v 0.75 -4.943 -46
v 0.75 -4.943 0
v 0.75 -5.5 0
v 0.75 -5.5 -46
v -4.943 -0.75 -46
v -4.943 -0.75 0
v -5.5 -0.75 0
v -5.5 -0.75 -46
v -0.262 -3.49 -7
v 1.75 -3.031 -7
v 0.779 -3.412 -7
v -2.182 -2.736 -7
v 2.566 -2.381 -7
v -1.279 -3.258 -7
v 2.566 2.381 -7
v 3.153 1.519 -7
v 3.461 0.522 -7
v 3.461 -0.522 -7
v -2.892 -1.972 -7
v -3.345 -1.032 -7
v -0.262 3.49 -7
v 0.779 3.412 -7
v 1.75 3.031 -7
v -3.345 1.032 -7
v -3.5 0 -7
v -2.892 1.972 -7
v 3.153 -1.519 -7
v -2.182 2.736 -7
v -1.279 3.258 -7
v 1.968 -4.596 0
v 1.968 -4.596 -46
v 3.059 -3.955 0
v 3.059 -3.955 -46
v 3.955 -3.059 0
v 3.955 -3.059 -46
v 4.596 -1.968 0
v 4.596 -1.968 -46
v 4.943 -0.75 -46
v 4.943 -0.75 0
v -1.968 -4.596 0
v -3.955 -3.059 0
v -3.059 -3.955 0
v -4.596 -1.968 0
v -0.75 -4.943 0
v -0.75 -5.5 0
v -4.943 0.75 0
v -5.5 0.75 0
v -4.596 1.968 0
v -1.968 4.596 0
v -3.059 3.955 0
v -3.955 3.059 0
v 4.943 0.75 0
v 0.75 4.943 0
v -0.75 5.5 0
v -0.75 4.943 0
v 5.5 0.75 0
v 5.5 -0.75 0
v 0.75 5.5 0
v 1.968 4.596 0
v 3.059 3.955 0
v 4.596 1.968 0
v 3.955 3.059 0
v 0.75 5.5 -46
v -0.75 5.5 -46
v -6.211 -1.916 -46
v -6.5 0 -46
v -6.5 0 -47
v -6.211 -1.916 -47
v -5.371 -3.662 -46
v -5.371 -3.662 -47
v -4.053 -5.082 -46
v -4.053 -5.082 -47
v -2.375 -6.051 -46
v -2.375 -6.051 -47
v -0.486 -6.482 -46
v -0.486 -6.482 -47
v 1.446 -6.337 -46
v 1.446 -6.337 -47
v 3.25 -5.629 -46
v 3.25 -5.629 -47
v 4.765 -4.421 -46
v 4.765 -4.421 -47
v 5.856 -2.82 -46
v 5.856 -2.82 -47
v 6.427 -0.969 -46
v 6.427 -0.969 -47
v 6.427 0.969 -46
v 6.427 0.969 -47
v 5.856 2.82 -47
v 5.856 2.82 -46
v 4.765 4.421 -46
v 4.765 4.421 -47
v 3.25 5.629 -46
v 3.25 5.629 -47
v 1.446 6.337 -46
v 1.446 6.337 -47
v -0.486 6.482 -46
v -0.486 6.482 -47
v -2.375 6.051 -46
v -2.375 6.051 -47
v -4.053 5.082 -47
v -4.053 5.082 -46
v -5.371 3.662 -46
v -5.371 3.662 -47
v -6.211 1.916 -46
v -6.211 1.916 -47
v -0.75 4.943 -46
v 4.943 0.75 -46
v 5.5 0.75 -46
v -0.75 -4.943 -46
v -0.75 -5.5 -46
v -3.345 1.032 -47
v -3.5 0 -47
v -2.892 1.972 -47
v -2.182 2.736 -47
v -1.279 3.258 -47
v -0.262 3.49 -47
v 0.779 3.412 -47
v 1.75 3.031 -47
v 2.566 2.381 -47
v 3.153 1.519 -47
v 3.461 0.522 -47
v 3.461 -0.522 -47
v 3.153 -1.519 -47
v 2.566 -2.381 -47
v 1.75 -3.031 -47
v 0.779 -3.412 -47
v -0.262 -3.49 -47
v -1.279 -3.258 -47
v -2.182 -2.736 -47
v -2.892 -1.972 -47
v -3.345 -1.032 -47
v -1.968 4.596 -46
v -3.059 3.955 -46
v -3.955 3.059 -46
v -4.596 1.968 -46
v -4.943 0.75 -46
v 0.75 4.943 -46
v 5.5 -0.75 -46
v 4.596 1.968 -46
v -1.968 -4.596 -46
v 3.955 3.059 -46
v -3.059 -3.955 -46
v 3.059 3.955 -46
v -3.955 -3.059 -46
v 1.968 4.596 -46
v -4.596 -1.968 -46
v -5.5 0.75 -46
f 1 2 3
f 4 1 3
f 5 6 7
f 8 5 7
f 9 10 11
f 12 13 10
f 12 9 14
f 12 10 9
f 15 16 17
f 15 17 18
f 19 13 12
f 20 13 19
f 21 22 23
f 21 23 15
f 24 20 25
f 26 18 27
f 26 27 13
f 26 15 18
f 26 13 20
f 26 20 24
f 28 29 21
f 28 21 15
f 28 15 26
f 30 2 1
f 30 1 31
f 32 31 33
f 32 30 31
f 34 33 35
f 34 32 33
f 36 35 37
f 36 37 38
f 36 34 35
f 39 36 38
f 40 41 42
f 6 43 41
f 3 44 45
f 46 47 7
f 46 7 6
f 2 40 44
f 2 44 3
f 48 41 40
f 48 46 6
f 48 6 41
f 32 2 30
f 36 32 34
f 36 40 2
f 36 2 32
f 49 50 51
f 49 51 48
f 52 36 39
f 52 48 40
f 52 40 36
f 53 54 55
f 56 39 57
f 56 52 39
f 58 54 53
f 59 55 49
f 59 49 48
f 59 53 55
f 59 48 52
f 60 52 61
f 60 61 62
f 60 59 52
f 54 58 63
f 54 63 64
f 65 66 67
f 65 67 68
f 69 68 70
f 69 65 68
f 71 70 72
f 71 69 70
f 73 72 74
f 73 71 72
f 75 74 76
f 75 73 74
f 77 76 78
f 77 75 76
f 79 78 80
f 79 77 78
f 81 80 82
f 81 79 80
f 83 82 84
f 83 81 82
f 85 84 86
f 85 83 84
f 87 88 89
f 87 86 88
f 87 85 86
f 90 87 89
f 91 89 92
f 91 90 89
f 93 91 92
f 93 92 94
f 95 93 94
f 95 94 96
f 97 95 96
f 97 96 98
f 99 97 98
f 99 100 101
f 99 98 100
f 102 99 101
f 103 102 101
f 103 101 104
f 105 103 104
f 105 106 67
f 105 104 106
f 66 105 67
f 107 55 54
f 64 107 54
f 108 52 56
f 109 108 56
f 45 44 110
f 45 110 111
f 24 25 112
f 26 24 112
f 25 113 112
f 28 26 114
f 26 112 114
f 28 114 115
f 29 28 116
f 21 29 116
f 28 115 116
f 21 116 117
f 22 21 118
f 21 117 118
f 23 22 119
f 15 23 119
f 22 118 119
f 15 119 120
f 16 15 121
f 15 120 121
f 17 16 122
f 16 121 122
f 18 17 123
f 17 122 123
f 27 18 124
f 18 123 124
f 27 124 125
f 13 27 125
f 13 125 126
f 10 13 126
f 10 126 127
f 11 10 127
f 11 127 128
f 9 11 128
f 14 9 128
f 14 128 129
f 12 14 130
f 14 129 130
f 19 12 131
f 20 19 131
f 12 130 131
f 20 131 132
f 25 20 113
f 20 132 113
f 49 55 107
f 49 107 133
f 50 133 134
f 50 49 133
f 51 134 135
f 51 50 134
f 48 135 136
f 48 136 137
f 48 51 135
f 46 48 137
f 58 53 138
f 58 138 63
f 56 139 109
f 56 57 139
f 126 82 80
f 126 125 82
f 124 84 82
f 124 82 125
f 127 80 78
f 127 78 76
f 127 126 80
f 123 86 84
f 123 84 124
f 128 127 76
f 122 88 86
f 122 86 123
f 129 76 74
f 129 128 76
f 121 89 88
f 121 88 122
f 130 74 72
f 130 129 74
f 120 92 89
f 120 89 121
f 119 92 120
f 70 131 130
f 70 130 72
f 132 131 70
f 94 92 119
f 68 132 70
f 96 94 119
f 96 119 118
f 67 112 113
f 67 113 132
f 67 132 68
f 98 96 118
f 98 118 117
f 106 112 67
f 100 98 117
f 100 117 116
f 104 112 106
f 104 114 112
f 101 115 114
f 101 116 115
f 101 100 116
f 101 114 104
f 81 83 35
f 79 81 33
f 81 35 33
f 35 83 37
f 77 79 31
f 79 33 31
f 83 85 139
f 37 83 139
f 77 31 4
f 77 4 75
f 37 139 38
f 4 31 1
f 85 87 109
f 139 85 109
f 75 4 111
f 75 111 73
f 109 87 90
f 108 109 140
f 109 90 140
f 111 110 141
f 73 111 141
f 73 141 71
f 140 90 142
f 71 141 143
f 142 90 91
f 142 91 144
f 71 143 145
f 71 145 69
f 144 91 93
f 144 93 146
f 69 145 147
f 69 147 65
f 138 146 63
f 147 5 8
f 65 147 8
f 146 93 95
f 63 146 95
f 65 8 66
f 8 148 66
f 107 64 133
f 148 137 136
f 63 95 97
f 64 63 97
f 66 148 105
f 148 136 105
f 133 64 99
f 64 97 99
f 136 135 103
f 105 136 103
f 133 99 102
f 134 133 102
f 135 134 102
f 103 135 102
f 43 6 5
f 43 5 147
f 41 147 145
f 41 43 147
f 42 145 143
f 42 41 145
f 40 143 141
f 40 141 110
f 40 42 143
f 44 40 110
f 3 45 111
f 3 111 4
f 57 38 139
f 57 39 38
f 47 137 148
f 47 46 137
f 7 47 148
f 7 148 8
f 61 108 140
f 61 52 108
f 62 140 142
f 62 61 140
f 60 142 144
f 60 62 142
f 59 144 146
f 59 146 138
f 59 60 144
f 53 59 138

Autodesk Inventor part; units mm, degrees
ref_plane "YZ Plane" through (0, 0, 0) normal (1, 0, 0) x (0, 1, 0)
ref_plane "XZ Plane" through (0, 0, 0) normal (0, 1, 0) x (-1, 0, 0)
ref_plane "XY Plane" through (0, 0, 0) normal (0, 0, 1) x (1, 0, 0)
sketch "Boceto1" plane through (0, 0, 0) normal (0, 0, 1) x (1, 0, 0)
  line L0 (0, 12.1119) -> (0, -11.4197) construction
  line L1 (-11.1817, 0) -> (11.1817, 0) construction
  line L2 (4.9434, 0.75) -> (5.5, 0.75)
  line L3 (4.9434, -0.75) -> (5.5, -0.75)
  line L4 (5.5, -0.75) -> (5.5, 0.75)
  line L5 (-0.75, 4.9434) -> (-0.75, 5.5)
  line L6 (0.75, 5.5) -> (-0.75, 5.5)
  line L7 (0.75, 4.9434) -> (0.75, 5.5)
  line L8 (-4.9434, -0.75) -> (-5.5, -0.75)
  line L9 (-5.5, 0.75) -> (-5.5, -0.75)
  line L10 (-4.9434, 0.75) -> (-5.5, 0.75)
  line L11 (0.75, -4.9434) -> (0.75, -5.5)
  line L12 (-0.75, -5.5) -> (0.75, -5.5)
  line L13 (-0.75, -4.9434) -> (-0.75, -5.5)
  arc A0 (-0.75, 4.9434) -> (-4.9434, 0.75) centre (0, 0) ccw
  arc A1 (-4.9434, -0.75) -> (-0.75, -4.9434) centre (0, 0) ccw
  arc A2 (0.75, -4.9434) -> (4.9434, -0.75) centre (0, 0) ccw
  arc A3 (4.9434, 0.75) -> (0.75, 4.9434) centre (0, 0) ccw
  circle A4 centre (0, 0) radius 5 construction
  point P0 (5.5, 0)
  dimension "d3" = 0.75
  dimension "d4" = 1.5
  dimension "d5" = 360
  dimension "d7" = 0.5
  dimension "d8" = 5
  dimension "d43" = 10
extrude "Extrusión1" add sketch "Boceto1" against normal blind 46
sketch "Boceto3" plane through (0, 0, -46) normal (0, 0, -1) x (-1, 0, 0)
  circle A0 centre (0, 0) radius 6.5
  dimension "d49" = 13
extrude "Extrusión3" add sketch "Boceto3" along normal blind 1
sketch "Boceto2" plane through (0, 0, -47) normal (0, 0, -1) x (-1, 0, 0)
  circle A0 centre (0, 0) radius 3.5
  dimension "d46" = 7
extrude "Extrusión2" cut sketch "Boceto2" against normal blind 40
properties part number "HIN-61 BISAGRA (BUJE PLASTICO)" material "Plástico ABS"
